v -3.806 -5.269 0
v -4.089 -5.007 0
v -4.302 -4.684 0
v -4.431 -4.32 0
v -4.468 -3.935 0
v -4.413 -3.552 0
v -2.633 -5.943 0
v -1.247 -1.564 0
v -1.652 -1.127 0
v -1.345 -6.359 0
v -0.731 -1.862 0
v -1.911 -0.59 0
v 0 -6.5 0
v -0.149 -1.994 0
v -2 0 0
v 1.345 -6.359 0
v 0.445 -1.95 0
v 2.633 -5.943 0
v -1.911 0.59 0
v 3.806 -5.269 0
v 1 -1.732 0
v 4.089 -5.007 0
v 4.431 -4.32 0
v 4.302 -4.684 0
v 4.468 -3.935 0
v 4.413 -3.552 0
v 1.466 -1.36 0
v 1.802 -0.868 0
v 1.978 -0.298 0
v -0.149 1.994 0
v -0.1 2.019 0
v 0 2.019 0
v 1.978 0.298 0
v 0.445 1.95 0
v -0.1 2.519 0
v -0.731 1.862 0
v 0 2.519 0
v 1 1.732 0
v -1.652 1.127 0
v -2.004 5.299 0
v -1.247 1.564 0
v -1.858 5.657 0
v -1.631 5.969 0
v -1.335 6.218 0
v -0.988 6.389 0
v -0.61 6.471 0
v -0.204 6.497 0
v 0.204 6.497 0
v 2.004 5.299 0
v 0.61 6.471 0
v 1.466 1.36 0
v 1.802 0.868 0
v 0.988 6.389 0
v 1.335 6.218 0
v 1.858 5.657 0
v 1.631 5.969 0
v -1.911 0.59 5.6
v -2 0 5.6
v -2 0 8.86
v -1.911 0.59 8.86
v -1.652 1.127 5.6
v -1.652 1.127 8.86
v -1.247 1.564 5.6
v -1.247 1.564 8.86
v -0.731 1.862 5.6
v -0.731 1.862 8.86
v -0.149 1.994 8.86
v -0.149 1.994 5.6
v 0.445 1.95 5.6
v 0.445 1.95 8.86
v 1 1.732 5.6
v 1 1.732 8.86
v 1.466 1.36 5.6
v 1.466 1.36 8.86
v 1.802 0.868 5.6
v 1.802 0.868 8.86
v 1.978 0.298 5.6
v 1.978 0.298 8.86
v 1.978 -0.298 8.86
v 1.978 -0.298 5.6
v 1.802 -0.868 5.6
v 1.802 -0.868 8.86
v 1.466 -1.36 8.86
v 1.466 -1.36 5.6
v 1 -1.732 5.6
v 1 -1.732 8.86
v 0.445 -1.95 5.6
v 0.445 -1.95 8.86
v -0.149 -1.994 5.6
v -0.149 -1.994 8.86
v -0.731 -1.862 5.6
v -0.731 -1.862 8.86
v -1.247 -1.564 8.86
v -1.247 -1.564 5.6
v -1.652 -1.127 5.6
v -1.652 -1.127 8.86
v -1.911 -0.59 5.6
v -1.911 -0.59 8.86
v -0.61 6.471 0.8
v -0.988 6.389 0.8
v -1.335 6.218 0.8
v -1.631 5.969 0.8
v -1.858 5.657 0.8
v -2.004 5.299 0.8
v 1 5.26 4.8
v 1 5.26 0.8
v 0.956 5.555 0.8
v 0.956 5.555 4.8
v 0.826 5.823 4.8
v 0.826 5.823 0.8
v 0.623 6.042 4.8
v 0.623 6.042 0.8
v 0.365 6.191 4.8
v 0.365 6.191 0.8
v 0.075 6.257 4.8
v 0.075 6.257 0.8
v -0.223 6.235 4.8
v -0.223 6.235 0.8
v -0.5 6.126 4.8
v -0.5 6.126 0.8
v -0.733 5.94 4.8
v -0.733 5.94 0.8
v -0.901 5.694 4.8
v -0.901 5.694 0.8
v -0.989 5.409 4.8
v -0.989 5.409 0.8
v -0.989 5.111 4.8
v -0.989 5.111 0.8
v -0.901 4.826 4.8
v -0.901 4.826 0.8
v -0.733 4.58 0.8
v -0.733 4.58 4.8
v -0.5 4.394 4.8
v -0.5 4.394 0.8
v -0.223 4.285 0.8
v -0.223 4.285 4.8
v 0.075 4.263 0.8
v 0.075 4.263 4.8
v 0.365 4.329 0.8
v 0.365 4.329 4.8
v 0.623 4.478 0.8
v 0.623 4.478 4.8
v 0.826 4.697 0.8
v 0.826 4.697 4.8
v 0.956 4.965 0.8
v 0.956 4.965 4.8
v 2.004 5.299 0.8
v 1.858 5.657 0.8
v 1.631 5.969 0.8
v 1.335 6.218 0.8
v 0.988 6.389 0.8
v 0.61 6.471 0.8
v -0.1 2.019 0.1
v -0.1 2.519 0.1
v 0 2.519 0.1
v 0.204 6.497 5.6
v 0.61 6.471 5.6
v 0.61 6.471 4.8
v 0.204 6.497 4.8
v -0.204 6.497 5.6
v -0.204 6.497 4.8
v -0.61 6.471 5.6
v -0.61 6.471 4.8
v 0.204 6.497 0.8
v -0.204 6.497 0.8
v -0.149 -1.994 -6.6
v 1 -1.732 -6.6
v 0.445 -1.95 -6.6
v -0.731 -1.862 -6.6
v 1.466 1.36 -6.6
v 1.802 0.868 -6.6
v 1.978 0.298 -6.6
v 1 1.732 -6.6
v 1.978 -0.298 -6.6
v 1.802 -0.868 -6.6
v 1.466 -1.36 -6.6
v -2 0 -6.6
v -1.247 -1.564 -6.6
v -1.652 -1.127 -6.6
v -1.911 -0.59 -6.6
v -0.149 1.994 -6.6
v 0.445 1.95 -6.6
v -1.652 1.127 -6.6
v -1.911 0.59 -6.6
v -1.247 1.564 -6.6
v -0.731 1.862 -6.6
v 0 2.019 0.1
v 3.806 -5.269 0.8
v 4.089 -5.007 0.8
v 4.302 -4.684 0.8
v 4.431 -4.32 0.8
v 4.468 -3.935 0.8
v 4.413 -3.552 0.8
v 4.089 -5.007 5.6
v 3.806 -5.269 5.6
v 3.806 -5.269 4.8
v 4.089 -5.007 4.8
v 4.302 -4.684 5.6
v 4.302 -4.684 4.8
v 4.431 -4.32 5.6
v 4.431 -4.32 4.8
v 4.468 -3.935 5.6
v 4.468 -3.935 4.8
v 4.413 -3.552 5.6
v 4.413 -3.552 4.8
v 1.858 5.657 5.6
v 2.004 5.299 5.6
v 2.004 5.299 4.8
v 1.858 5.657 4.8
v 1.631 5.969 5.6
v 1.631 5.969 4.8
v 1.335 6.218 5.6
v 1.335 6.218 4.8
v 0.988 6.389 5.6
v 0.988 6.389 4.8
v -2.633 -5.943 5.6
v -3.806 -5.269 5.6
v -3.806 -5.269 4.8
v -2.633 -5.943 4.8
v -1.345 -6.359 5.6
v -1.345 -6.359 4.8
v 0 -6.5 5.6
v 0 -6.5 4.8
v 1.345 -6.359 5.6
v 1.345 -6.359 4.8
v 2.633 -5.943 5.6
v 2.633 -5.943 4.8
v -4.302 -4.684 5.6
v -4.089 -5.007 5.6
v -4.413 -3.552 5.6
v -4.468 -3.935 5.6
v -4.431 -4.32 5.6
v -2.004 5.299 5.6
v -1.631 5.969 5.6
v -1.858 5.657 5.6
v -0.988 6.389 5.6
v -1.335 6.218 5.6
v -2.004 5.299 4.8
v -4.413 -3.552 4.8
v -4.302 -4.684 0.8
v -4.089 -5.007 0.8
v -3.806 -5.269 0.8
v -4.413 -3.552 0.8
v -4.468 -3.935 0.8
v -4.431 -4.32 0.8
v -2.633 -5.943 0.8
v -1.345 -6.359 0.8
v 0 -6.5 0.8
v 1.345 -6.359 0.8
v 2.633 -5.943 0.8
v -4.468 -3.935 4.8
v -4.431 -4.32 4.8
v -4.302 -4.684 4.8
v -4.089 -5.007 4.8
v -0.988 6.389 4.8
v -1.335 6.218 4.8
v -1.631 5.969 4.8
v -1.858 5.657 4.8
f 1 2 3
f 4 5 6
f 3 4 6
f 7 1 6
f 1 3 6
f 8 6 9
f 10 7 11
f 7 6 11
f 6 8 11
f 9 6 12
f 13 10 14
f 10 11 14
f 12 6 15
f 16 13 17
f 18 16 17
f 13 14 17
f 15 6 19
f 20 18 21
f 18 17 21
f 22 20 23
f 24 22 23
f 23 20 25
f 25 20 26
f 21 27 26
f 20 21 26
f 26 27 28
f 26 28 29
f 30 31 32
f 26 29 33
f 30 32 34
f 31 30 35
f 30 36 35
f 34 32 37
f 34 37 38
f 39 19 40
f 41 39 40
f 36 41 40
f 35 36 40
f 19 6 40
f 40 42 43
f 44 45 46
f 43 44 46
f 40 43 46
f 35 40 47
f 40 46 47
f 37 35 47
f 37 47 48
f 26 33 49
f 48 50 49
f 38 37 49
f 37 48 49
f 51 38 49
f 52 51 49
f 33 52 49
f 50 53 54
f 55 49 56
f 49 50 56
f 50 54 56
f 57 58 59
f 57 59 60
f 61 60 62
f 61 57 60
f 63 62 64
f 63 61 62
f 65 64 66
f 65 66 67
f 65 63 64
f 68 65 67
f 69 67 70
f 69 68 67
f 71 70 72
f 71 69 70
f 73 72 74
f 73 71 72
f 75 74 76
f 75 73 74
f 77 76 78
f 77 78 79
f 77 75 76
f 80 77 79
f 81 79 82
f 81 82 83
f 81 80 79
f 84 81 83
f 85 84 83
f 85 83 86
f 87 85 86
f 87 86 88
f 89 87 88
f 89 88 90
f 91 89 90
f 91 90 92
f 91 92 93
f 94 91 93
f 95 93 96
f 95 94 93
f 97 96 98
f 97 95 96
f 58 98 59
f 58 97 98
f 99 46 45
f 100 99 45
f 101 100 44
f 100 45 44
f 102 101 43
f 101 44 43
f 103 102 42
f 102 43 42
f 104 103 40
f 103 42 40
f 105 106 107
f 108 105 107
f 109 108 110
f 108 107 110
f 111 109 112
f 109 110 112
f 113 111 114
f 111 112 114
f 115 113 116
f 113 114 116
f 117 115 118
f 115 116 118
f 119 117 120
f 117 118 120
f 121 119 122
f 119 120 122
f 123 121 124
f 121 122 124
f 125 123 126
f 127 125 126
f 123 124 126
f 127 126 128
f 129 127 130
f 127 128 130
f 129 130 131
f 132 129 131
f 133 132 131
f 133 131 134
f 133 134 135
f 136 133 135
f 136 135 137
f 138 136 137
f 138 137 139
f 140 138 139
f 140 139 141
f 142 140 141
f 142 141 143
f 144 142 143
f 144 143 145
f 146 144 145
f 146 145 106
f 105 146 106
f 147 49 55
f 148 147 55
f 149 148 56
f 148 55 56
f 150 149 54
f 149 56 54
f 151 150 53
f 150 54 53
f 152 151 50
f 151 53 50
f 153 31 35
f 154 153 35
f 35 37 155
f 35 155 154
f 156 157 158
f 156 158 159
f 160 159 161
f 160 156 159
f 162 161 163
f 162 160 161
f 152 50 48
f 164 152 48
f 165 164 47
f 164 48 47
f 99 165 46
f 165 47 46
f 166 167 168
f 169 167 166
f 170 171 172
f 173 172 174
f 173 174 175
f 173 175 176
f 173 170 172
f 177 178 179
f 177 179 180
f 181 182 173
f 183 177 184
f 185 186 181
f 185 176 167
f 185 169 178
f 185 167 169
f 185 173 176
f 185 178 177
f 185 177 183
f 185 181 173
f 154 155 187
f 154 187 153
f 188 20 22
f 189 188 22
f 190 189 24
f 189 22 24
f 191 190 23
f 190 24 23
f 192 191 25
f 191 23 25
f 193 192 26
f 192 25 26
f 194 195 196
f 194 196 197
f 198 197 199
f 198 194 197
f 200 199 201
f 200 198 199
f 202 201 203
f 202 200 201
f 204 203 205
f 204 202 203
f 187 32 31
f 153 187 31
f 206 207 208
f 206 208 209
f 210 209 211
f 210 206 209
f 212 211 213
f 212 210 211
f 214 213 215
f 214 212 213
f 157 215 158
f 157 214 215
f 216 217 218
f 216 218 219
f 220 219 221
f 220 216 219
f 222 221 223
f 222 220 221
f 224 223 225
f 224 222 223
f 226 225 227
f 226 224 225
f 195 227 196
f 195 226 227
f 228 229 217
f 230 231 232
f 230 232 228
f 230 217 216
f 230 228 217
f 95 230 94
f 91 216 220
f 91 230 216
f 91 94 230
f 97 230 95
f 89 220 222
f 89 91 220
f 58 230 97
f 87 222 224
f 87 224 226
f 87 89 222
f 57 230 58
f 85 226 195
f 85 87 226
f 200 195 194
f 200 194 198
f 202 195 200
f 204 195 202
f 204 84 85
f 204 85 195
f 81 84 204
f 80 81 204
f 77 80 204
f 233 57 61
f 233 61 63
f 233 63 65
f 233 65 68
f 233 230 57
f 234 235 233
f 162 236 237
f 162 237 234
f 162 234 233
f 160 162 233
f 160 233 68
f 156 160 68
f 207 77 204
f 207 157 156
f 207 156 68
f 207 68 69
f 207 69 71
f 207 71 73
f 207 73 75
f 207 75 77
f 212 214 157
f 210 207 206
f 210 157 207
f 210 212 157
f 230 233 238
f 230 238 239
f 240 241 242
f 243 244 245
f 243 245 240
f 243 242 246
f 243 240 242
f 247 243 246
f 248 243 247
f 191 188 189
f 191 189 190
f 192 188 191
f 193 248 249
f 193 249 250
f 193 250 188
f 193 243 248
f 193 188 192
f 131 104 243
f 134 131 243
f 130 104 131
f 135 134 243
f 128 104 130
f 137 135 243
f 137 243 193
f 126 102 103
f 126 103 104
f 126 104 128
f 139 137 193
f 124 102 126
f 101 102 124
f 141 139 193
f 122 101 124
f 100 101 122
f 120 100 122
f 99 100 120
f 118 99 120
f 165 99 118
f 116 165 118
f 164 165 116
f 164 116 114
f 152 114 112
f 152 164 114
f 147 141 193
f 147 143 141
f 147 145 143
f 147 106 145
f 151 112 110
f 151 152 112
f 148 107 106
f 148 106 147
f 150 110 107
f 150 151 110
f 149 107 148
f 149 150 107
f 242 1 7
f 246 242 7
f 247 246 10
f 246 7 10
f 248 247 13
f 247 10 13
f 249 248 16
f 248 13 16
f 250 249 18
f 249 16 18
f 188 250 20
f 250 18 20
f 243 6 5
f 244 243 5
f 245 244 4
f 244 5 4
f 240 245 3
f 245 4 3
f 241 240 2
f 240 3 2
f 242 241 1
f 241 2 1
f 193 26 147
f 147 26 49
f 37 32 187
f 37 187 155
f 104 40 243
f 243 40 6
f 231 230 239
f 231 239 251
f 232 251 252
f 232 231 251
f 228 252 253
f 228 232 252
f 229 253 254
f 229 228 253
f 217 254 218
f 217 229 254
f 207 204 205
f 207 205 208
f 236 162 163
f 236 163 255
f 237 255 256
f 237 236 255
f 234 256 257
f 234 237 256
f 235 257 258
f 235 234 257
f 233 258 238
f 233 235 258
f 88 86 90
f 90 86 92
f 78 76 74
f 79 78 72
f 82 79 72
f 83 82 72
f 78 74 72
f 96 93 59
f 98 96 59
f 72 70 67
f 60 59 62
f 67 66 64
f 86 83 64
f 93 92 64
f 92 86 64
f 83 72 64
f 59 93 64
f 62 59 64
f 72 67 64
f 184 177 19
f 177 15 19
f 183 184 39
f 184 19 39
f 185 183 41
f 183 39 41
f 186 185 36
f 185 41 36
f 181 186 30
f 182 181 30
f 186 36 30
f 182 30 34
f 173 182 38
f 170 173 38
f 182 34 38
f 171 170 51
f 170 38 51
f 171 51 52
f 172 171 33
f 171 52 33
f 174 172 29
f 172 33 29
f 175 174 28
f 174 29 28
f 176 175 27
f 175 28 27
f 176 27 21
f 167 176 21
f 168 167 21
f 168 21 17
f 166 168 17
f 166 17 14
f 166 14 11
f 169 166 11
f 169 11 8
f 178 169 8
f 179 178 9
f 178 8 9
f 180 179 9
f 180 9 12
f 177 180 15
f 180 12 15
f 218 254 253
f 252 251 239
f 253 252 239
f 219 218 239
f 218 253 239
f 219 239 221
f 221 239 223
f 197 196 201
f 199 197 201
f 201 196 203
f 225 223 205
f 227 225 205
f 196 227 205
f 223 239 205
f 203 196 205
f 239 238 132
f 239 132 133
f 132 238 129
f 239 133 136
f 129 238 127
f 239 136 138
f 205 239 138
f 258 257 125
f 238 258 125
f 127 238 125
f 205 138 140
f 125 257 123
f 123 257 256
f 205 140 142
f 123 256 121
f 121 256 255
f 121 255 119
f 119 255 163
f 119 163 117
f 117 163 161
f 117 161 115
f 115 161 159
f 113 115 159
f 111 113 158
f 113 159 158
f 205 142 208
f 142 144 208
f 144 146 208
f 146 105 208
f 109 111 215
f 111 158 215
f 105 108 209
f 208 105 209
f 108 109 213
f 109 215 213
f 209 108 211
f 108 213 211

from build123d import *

# Parameters (mm, degrees)
BOSS_EXTRUDE1_DEPTH = 0.8
SKETCH2_R           = 1
BOSS_EXTRUDE2_DEPTH = 2
SKETCH3_R           = 2
BOSS_EXTRUDE3_DEPTH = 3.26
SKETCH4_R           = 2
BOSS_EXTRUDE4_DEPTH = 3.34
SKETCH5_W           = 0.1
SKETCH5_H           = 0.5
CUT_EXTRUDE1_DEPTH  = 0.1


with BuildPart() as part:
    # Sketch1 → Boss-Extrude1 (new body)
    with BuildSketch(Plane.XY):
        with BuildLine():
            Line((-2.003843202, 5.298536735), (-4.412682198, -3.552198604))
            ThreePointArc((-4.412682198, -3.552198604), (-4.377352827, -4.505653519), (-3.805602751, -5.269476986))
            ThreePointArc((-3.805602751, -5.269476986), (0, -6.5), (3.805602751, -5.269476986))
            ThreePointArc((3.805602751, -5.269476986), (4.377352827, -4.505653519), (4.412682198, -3.552198604))
            Line((4.412682198, -3.552198604), (2.003843202, 5.298536735))
            ThreePointArc((2.003843202, 5.298536735), (1.490188902, 6.102578835), (0.610204082, 6.471294382))
            ThreePointArc((0.610204082, 6.471294382), (0, 6.5), (-0.610204082, 6.471294382))
            ThreePointArc((-0.610204082, 6.471294382), (-1.490188902, 6.102578835), (-2.003843202, 5.298536735))
        make_face()
    extrude(amount=BOSS_EXTRUDE1_DEPTH)

    # Sketch2 → Boss-Extrude2 (add)
    with BuildSketch(Plane.XY.offset(0.8)):
        with Locations((0, 5.26)):
            Circle(SKETCH2_R)
    extrude(amount=BOSS_EXTRUDE2_DEPTH)

    # Sketch3 → Boss-Extrude3 (add)
    with BuildSketch(Plane(origin=(0, 0, 0), x_dir=(-1, 0, 0), z_dir=(0, 0, -1))):
        Circle(SKETCH3_R)
    extrude(amount=BOSS_EXTRUDE3_DEPTH)

    # Mirror1: part across plane


with BuildPart() as part_1:
    add(part.part)
    add(part.part.mirror(Plane(origin=(0, 5.26, 2.8), x_dir=(1, 0, 0), z_dir=(0, 0, 1))))

    # Sketch4 → Boss-Extrude4 (add)
    with BuildSketch(Plane(origin=(0, 0, -3.26), x_dir=(-1, 0, 0), z_dir=(0, 0, -1))):
        Circle(SKETCH4_R)
    extrude(amount=BOSS_EXTRUDE4_DEPTH)

    # Sketch5 → Cut-Extrude1 (cut)
    with BuildSketch(Plane(origin=(0, 0, 0), x_dir=(-1, 0, 0), z_dir=(0, 0, -1))):
        with Locations((0.05, 2.269348072)):
            Rectangle(SKETCH5_W, SKETCH5_H)
    extrude(amount=-CUT_EXTRUDE1_DEPTH, mode=Mode.SUBTRACT)


solid = part_1.part
